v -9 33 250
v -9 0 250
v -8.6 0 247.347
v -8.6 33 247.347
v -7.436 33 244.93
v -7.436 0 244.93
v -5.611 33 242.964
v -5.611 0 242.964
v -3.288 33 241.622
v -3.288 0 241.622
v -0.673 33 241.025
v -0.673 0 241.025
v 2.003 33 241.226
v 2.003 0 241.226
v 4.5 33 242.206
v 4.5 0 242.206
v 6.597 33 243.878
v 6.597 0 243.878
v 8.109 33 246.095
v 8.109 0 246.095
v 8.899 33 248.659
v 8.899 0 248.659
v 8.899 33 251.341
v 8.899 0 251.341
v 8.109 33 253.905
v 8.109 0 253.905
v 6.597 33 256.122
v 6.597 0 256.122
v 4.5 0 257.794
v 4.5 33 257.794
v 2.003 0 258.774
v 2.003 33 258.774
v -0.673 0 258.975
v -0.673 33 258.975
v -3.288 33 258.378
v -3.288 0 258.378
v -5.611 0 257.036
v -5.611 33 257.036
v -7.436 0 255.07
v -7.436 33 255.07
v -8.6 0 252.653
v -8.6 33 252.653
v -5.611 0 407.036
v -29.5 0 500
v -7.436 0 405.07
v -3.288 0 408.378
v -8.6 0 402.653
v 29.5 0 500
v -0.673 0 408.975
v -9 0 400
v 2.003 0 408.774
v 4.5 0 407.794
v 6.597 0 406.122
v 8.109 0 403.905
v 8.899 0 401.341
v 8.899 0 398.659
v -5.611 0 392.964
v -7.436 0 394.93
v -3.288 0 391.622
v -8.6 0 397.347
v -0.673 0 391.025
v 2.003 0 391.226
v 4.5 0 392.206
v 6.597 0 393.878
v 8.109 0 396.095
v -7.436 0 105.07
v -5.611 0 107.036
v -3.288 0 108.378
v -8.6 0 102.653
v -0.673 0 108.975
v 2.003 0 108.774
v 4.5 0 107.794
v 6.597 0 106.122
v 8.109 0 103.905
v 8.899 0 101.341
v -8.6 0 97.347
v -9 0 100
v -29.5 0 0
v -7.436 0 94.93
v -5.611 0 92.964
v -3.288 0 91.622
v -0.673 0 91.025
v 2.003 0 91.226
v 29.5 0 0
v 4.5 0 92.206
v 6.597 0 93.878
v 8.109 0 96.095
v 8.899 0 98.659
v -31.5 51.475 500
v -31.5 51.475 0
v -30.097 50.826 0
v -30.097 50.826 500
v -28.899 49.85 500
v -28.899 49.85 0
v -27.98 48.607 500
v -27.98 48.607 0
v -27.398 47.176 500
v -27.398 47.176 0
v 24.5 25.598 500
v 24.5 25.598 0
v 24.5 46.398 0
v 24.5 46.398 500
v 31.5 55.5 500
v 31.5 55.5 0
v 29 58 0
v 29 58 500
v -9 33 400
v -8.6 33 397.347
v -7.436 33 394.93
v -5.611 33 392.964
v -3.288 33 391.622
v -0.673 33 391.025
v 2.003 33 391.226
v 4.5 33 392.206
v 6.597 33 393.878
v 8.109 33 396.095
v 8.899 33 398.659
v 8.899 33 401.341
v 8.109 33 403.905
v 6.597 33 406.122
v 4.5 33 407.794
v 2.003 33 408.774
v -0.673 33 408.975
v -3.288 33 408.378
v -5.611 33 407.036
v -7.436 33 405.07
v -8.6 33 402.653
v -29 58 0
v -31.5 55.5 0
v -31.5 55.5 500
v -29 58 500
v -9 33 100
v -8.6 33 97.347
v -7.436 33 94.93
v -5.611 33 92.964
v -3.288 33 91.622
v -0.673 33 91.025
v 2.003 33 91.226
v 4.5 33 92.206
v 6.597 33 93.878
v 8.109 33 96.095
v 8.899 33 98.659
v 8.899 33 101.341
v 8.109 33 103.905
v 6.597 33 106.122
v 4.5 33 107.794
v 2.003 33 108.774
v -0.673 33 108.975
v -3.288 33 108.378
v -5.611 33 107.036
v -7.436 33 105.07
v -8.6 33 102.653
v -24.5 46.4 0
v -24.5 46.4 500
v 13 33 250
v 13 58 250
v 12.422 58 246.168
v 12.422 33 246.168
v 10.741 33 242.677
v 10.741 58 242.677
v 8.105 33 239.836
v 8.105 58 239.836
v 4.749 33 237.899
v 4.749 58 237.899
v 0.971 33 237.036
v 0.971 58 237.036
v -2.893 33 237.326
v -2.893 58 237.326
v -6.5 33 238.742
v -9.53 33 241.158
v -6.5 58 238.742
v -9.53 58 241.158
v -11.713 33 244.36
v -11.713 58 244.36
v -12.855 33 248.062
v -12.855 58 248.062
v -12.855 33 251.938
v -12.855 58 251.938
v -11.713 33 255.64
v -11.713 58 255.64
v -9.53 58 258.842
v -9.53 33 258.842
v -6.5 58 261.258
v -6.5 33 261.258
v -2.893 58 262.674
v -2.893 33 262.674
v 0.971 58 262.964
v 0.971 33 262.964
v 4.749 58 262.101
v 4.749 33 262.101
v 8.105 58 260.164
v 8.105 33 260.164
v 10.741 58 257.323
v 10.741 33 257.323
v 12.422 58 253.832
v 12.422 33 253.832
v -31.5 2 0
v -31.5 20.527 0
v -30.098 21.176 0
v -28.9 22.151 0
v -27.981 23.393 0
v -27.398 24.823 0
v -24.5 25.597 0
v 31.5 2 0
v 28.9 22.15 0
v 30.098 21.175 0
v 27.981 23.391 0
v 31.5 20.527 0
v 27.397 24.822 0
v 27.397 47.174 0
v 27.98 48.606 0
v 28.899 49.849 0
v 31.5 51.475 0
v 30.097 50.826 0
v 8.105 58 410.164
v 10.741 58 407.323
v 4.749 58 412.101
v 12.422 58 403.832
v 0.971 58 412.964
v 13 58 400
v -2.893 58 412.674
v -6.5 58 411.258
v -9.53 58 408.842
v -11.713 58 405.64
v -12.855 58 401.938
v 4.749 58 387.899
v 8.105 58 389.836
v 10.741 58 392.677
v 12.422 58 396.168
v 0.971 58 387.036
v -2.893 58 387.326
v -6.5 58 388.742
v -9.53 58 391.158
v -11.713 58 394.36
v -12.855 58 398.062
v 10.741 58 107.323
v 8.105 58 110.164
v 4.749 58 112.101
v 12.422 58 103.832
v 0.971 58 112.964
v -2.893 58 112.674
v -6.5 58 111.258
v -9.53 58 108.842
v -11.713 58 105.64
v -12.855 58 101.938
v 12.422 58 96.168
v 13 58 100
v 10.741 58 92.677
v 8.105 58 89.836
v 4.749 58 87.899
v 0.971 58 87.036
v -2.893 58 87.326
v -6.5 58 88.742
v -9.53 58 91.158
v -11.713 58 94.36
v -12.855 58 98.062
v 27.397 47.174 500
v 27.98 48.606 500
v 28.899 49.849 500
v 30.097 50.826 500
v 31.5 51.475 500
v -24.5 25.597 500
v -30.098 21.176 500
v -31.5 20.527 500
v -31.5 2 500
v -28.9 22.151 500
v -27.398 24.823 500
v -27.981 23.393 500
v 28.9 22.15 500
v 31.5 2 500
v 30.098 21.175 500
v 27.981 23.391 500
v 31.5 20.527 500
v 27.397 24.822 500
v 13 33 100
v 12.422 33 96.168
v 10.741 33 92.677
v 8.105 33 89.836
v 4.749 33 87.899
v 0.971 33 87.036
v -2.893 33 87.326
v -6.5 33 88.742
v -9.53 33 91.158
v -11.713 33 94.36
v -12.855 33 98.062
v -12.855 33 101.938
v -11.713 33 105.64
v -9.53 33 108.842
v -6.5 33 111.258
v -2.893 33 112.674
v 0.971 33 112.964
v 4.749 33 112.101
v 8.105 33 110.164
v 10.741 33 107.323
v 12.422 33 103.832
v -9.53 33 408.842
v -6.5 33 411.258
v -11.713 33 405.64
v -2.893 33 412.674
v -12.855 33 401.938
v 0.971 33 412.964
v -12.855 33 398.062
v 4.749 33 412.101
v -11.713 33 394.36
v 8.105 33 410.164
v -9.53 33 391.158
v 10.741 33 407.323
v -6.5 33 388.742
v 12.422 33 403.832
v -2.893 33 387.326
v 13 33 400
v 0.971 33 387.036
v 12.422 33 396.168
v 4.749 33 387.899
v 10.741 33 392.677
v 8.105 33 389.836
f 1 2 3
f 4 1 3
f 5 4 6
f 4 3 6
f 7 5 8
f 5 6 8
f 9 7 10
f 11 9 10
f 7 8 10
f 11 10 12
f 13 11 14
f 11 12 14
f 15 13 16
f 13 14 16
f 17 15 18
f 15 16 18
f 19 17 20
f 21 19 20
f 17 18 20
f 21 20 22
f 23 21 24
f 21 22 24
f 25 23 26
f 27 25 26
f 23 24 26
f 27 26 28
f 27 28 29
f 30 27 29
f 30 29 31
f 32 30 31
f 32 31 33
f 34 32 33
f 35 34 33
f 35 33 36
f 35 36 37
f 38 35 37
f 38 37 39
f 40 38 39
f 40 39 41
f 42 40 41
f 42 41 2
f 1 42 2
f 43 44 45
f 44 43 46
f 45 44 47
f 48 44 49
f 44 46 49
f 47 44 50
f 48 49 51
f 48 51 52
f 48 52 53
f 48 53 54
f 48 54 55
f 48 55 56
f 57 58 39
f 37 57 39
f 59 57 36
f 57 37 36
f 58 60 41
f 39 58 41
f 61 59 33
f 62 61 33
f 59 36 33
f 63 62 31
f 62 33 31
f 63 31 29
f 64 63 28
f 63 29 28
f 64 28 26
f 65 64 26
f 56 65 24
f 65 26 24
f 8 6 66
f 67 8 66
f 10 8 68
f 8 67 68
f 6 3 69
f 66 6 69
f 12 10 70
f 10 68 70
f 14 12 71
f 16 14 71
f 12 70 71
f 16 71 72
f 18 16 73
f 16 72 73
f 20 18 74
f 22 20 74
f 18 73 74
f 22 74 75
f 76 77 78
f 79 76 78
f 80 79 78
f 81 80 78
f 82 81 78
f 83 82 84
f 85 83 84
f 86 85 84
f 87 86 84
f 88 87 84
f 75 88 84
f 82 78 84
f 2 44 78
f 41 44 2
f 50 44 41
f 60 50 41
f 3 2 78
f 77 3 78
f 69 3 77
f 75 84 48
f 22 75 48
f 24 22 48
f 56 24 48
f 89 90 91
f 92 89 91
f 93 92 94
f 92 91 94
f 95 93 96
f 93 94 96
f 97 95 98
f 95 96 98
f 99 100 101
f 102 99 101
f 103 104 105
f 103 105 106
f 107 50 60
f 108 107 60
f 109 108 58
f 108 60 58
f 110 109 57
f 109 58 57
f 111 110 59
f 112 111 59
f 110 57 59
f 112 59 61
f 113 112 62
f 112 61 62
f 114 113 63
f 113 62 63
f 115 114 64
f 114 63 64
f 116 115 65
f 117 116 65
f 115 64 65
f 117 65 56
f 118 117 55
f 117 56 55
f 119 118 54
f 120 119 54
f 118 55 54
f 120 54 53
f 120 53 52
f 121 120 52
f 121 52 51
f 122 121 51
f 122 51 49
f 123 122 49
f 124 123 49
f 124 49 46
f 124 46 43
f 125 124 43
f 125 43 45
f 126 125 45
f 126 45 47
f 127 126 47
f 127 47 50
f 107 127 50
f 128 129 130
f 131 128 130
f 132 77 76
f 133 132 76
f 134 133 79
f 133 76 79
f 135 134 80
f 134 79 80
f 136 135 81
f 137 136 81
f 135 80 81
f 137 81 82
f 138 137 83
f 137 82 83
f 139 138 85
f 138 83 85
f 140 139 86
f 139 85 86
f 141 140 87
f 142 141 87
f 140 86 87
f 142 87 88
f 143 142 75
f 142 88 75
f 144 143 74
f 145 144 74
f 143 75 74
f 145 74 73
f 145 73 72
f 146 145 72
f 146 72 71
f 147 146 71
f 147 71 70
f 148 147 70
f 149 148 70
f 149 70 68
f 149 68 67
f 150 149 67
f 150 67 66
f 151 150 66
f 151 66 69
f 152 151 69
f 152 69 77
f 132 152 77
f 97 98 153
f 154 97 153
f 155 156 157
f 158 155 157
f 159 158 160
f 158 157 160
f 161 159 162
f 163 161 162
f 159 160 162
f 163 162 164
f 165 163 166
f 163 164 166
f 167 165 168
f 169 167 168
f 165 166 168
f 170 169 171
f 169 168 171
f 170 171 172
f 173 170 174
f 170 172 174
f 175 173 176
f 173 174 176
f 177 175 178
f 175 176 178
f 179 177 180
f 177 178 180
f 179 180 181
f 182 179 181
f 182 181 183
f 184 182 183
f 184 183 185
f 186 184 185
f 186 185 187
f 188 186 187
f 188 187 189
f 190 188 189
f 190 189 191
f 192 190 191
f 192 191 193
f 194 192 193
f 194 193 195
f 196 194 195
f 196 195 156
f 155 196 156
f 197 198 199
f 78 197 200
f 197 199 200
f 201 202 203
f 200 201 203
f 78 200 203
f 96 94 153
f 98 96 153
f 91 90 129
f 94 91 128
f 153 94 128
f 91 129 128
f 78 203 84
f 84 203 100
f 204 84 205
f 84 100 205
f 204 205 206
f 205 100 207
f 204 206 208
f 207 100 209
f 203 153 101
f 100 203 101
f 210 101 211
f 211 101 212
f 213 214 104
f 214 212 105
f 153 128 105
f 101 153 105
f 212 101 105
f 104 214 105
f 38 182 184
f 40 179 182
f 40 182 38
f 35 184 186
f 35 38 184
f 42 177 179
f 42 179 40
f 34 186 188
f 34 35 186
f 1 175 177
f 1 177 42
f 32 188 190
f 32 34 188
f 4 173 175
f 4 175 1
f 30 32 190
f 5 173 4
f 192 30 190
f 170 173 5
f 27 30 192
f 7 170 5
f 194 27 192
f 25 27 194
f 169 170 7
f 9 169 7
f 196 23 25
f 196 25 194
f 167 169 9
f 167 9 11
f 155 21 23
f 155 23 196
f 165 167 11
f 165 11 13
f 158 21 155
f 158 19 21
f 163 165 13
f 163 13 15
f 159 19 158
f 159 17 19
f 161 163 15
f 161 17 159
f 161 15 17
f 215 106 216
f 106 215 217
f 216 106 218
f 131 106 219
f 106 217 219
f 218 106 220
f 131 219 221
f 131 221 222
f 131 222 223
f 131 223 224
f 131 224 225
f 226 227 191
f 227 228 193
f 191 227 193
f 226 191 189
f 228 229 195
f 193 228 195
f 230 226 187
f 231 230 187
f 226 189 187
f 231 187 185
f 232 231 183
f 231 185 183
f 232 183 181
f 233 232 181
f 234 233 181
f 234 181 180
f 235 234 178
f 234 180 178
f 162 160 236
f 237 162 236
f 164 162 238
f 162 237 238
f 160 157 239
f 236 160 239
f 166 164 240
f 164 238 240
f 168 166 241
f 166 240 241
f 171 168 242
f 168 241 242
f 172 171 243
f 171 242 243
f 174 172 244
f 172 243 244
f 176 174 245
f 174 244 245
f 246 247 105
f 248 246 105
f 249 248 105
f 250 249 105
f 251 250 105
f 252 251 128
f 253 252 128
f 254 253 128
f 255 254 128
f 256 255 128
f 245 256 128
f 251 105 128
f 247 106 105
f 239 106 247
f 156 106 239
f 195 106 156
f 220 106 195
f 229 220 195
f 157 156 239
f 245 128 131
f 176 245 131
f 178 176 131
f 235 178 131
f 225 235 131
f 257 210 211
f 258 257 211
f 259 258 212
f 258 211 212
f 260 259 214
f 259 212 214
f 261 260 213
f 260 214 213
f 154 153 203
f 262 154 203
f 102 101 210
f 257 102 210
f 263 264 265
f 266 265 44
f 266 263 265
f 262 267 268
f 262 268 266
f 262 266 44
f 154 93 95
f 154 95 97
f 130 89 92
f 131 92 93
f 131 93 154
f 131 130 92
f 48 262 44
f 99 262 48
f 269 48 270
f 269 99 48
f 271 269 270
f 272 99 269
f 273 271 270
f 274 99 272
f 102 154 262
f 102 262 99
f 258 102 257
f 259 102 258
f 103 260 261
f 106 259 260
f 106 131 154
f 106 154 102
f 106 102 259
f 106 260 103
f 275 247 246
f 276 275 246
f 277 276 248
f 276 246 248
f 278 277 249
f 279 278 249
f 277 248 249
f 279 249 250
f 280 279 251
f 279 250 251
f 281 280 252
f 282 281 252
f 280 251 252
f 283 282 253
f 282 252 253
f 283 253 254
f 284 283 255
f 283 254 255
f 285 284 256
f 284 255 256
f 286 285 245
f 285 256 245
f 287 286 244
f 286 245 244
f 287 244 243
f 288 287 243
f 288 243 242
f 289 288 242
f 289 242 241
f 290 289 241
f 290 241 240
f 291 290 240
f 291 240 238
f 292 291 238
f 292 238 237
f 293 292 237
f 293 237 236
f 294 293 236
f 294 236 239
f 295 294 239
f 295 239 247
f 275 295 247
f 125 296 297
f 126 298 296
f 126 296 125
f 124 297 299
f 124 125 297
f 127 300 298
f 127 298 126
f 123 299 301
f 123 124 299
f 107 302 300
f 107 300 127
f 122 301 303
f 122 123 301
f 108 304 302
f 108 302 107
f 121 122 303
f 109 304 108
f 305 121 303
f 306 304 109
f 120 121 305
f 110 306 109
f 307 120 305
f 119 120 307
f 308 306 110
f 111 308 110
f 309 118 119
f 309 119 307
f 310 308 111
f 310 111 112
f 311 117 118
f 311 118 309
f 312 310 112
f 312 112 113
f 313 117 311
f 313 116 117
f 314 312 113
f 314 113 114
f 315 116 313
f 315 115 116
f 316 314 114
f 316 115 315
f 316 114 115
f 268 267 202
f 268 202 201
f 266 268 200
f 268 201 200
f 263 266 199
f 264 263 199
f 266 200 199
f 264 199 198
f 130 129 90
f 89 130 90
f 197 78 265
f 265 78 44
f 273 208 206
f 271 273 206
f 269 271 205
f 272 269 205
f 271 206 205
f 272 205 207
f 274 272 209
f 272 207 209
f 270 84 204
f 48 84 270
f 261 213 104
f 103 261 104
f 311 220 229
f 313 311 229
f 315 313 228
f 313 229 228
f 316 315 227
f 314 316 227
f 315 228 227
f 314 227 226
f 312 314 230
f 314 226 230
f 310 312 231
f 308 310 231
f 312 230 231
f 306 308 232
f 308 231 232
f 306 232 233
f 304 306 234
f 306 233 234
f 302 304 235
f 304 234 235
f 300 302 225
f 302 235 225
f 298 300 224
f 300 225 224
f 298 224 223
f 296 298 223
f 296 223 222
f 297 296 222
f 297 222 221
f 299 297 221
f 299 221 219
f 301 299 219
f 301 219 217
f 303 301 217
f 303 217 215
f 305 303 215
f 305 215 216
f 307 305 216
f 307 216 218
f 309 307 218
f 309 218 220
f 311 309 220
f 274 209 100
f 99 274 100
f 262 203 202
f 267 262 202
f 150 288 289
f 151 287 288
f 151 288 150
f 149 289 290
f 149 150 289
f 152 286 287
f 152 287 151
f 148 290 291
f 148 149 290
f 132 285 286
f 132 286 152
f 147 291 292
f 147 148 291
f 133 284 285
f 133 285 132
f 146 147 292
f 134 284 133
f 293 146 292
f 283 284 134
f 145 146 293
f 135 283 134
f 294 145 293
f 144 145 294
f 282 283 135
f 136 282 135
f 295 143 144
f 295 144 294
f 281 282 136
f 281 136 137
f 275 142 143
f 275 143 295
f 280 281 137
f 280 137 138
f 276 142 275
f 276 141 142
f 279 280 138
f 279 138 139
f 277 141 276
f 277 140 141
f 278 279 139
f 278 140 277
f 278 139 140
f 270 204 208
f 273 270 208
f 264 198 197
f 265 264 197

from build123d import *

# Parameters (mm, degrees)
RESSALTO_EXTRUS_O1_DEPTH                             = 500
REBAIXO_PARA_PARAFUSO_DE_CABE_A_SEXTAVAD_D           = 18
REBAIXO_PARA_PARAFUSO_DE_CABE_A_SEXTAVAD_DEPTH       = 58
REBAIXO_PARA_PARAFUSO_DE_CABE_A_SEXTAVAD_CBORE_D     = 26
REBAIXO_PARA_PARAFUSO_DE_CABE_A_SEXTAVAD_CBORE_DEPTH = 25
CHANFRO1_SIZE2                                       = 2.500287455
CHANFRO1_SIZE                                        = 2.500257245
CHANFRO2_SIZE2                                       = 2.500423779
CHANFRO2_SIZE                                        = 2.500287455
CHANFRO3_SIZE                                        = 2


with BuildPart() as part:
    # Esboço1 → Ressalto-extrusão1 (new body)
    with BuildSketch(Plane.XY):
        with BuildLine():
            Line((-31.5, 20.527298986), (-31.5, 0))
            Line((-31.5, 0), (31.5, 0))
            Line((31.5, 0), (31.5, 20.527298986))
            ThreePointArc((31.5, 20.527298986), (28.900076881, 22.150342104), (27.397266061, 24.82156445))
            Line((27.397266061, 24.82156445), (24.5, 25.597882749))
            Line((24.5, 25.597882749), (24.5, 46.397686197))
            Line((24.5, 46.397686197), (27.397119712, 47.17387922))
            ThreePointArc((27.397119712, 47.17387922), (28.898613337, 49.848990738), (31.5, 51.474872705))
            Line((31.5, 51.474872705), (31.5, 58))
            Line((31.5, 58), (-31.5, 58))
            Line((-31.5, 58), (-31.5, 51.474872705))
            ThreePointArc((-31.5, 51.474872705), (-28.899411057, 49.849685923), (-27.397802135, 47.175837466))
            Line((-27.397802135, 47.175837466), (-24.5, 46.399706372))
            Line((-24.5, 46.399706372), (-24.5, 25.596973237))
            Line((-24.5, 25.596973237), (-27.397939574, 24.823365186))
            ThreePointArc((-27.397939574, 24.823365186), (-28.900095464, 22.151244343), (-31.5, 20.527298986))
        make_face()
    extrude(amount=RESSALTO_EXTRUS_O1_DEPTH)

    # Rebaixo para parafuso de cabeça sextavada de M161
    with Locations(Plane(origin=(0, 58, 0), x_dir=(1, 0, 0), z_dir=(0, 1, 0))):
        with Locations((0, -100), (0, -250), (0, -400), (0, -550), (0, -700), (0, -850), (0, -1000), (0, -1150), (0, -1300), (0, -1450), (0, -1600), (0, -1750), (0, -1900), (0, -2050), (0, -2200), (0, -2350)):
            CounterBoreHole(REBAIXO_PARA_PARAFUSO_DE_CABE_A_SEXTAVAD_D / 2, REBAIXO_PARA_PARAFUSO_DE_CABE_A_SEXTAVAD_CBORE_D / 2, REBAIXO_PARA_PARAFUSO_DE_CABE_A_SEXTAVAD_CBORE_DEPTH, depth=REBAIXO_PARA_PARAFUSO_DE_CABE_A_SEXTAVAD_DEPTH)

    # Chanfro1
    chanfro1_edges = [part.edges().sort_by_distance(p)[0] for p in [
        (-31.5, 58, 250),
    ]]
    chamfer(chanfro1_edges, length=CHANFRO1_SIZE, length2=CHANFRO1_SIZE2)

    # Chanfro2
    chanfro2_edges = [part.edges().sort_by_distance(p)[0] for p in [
        (31.5, 58, 250),
    ]]
    chamfer(chanfro2_edges, length=CHANFRO2_SIZE, length2=CHANFRO2_SIZE2)

    # Chanfro3
    chanfro3_edges = [part.edges().sort_by_distance(p)[0] for p in [
        (31.5, 0, 250),
        (-31.5, 0, 250),
    ]]
    chamfer(chanfro3_edges, length=CHANFRO3_SIZE)


solid = part.part
